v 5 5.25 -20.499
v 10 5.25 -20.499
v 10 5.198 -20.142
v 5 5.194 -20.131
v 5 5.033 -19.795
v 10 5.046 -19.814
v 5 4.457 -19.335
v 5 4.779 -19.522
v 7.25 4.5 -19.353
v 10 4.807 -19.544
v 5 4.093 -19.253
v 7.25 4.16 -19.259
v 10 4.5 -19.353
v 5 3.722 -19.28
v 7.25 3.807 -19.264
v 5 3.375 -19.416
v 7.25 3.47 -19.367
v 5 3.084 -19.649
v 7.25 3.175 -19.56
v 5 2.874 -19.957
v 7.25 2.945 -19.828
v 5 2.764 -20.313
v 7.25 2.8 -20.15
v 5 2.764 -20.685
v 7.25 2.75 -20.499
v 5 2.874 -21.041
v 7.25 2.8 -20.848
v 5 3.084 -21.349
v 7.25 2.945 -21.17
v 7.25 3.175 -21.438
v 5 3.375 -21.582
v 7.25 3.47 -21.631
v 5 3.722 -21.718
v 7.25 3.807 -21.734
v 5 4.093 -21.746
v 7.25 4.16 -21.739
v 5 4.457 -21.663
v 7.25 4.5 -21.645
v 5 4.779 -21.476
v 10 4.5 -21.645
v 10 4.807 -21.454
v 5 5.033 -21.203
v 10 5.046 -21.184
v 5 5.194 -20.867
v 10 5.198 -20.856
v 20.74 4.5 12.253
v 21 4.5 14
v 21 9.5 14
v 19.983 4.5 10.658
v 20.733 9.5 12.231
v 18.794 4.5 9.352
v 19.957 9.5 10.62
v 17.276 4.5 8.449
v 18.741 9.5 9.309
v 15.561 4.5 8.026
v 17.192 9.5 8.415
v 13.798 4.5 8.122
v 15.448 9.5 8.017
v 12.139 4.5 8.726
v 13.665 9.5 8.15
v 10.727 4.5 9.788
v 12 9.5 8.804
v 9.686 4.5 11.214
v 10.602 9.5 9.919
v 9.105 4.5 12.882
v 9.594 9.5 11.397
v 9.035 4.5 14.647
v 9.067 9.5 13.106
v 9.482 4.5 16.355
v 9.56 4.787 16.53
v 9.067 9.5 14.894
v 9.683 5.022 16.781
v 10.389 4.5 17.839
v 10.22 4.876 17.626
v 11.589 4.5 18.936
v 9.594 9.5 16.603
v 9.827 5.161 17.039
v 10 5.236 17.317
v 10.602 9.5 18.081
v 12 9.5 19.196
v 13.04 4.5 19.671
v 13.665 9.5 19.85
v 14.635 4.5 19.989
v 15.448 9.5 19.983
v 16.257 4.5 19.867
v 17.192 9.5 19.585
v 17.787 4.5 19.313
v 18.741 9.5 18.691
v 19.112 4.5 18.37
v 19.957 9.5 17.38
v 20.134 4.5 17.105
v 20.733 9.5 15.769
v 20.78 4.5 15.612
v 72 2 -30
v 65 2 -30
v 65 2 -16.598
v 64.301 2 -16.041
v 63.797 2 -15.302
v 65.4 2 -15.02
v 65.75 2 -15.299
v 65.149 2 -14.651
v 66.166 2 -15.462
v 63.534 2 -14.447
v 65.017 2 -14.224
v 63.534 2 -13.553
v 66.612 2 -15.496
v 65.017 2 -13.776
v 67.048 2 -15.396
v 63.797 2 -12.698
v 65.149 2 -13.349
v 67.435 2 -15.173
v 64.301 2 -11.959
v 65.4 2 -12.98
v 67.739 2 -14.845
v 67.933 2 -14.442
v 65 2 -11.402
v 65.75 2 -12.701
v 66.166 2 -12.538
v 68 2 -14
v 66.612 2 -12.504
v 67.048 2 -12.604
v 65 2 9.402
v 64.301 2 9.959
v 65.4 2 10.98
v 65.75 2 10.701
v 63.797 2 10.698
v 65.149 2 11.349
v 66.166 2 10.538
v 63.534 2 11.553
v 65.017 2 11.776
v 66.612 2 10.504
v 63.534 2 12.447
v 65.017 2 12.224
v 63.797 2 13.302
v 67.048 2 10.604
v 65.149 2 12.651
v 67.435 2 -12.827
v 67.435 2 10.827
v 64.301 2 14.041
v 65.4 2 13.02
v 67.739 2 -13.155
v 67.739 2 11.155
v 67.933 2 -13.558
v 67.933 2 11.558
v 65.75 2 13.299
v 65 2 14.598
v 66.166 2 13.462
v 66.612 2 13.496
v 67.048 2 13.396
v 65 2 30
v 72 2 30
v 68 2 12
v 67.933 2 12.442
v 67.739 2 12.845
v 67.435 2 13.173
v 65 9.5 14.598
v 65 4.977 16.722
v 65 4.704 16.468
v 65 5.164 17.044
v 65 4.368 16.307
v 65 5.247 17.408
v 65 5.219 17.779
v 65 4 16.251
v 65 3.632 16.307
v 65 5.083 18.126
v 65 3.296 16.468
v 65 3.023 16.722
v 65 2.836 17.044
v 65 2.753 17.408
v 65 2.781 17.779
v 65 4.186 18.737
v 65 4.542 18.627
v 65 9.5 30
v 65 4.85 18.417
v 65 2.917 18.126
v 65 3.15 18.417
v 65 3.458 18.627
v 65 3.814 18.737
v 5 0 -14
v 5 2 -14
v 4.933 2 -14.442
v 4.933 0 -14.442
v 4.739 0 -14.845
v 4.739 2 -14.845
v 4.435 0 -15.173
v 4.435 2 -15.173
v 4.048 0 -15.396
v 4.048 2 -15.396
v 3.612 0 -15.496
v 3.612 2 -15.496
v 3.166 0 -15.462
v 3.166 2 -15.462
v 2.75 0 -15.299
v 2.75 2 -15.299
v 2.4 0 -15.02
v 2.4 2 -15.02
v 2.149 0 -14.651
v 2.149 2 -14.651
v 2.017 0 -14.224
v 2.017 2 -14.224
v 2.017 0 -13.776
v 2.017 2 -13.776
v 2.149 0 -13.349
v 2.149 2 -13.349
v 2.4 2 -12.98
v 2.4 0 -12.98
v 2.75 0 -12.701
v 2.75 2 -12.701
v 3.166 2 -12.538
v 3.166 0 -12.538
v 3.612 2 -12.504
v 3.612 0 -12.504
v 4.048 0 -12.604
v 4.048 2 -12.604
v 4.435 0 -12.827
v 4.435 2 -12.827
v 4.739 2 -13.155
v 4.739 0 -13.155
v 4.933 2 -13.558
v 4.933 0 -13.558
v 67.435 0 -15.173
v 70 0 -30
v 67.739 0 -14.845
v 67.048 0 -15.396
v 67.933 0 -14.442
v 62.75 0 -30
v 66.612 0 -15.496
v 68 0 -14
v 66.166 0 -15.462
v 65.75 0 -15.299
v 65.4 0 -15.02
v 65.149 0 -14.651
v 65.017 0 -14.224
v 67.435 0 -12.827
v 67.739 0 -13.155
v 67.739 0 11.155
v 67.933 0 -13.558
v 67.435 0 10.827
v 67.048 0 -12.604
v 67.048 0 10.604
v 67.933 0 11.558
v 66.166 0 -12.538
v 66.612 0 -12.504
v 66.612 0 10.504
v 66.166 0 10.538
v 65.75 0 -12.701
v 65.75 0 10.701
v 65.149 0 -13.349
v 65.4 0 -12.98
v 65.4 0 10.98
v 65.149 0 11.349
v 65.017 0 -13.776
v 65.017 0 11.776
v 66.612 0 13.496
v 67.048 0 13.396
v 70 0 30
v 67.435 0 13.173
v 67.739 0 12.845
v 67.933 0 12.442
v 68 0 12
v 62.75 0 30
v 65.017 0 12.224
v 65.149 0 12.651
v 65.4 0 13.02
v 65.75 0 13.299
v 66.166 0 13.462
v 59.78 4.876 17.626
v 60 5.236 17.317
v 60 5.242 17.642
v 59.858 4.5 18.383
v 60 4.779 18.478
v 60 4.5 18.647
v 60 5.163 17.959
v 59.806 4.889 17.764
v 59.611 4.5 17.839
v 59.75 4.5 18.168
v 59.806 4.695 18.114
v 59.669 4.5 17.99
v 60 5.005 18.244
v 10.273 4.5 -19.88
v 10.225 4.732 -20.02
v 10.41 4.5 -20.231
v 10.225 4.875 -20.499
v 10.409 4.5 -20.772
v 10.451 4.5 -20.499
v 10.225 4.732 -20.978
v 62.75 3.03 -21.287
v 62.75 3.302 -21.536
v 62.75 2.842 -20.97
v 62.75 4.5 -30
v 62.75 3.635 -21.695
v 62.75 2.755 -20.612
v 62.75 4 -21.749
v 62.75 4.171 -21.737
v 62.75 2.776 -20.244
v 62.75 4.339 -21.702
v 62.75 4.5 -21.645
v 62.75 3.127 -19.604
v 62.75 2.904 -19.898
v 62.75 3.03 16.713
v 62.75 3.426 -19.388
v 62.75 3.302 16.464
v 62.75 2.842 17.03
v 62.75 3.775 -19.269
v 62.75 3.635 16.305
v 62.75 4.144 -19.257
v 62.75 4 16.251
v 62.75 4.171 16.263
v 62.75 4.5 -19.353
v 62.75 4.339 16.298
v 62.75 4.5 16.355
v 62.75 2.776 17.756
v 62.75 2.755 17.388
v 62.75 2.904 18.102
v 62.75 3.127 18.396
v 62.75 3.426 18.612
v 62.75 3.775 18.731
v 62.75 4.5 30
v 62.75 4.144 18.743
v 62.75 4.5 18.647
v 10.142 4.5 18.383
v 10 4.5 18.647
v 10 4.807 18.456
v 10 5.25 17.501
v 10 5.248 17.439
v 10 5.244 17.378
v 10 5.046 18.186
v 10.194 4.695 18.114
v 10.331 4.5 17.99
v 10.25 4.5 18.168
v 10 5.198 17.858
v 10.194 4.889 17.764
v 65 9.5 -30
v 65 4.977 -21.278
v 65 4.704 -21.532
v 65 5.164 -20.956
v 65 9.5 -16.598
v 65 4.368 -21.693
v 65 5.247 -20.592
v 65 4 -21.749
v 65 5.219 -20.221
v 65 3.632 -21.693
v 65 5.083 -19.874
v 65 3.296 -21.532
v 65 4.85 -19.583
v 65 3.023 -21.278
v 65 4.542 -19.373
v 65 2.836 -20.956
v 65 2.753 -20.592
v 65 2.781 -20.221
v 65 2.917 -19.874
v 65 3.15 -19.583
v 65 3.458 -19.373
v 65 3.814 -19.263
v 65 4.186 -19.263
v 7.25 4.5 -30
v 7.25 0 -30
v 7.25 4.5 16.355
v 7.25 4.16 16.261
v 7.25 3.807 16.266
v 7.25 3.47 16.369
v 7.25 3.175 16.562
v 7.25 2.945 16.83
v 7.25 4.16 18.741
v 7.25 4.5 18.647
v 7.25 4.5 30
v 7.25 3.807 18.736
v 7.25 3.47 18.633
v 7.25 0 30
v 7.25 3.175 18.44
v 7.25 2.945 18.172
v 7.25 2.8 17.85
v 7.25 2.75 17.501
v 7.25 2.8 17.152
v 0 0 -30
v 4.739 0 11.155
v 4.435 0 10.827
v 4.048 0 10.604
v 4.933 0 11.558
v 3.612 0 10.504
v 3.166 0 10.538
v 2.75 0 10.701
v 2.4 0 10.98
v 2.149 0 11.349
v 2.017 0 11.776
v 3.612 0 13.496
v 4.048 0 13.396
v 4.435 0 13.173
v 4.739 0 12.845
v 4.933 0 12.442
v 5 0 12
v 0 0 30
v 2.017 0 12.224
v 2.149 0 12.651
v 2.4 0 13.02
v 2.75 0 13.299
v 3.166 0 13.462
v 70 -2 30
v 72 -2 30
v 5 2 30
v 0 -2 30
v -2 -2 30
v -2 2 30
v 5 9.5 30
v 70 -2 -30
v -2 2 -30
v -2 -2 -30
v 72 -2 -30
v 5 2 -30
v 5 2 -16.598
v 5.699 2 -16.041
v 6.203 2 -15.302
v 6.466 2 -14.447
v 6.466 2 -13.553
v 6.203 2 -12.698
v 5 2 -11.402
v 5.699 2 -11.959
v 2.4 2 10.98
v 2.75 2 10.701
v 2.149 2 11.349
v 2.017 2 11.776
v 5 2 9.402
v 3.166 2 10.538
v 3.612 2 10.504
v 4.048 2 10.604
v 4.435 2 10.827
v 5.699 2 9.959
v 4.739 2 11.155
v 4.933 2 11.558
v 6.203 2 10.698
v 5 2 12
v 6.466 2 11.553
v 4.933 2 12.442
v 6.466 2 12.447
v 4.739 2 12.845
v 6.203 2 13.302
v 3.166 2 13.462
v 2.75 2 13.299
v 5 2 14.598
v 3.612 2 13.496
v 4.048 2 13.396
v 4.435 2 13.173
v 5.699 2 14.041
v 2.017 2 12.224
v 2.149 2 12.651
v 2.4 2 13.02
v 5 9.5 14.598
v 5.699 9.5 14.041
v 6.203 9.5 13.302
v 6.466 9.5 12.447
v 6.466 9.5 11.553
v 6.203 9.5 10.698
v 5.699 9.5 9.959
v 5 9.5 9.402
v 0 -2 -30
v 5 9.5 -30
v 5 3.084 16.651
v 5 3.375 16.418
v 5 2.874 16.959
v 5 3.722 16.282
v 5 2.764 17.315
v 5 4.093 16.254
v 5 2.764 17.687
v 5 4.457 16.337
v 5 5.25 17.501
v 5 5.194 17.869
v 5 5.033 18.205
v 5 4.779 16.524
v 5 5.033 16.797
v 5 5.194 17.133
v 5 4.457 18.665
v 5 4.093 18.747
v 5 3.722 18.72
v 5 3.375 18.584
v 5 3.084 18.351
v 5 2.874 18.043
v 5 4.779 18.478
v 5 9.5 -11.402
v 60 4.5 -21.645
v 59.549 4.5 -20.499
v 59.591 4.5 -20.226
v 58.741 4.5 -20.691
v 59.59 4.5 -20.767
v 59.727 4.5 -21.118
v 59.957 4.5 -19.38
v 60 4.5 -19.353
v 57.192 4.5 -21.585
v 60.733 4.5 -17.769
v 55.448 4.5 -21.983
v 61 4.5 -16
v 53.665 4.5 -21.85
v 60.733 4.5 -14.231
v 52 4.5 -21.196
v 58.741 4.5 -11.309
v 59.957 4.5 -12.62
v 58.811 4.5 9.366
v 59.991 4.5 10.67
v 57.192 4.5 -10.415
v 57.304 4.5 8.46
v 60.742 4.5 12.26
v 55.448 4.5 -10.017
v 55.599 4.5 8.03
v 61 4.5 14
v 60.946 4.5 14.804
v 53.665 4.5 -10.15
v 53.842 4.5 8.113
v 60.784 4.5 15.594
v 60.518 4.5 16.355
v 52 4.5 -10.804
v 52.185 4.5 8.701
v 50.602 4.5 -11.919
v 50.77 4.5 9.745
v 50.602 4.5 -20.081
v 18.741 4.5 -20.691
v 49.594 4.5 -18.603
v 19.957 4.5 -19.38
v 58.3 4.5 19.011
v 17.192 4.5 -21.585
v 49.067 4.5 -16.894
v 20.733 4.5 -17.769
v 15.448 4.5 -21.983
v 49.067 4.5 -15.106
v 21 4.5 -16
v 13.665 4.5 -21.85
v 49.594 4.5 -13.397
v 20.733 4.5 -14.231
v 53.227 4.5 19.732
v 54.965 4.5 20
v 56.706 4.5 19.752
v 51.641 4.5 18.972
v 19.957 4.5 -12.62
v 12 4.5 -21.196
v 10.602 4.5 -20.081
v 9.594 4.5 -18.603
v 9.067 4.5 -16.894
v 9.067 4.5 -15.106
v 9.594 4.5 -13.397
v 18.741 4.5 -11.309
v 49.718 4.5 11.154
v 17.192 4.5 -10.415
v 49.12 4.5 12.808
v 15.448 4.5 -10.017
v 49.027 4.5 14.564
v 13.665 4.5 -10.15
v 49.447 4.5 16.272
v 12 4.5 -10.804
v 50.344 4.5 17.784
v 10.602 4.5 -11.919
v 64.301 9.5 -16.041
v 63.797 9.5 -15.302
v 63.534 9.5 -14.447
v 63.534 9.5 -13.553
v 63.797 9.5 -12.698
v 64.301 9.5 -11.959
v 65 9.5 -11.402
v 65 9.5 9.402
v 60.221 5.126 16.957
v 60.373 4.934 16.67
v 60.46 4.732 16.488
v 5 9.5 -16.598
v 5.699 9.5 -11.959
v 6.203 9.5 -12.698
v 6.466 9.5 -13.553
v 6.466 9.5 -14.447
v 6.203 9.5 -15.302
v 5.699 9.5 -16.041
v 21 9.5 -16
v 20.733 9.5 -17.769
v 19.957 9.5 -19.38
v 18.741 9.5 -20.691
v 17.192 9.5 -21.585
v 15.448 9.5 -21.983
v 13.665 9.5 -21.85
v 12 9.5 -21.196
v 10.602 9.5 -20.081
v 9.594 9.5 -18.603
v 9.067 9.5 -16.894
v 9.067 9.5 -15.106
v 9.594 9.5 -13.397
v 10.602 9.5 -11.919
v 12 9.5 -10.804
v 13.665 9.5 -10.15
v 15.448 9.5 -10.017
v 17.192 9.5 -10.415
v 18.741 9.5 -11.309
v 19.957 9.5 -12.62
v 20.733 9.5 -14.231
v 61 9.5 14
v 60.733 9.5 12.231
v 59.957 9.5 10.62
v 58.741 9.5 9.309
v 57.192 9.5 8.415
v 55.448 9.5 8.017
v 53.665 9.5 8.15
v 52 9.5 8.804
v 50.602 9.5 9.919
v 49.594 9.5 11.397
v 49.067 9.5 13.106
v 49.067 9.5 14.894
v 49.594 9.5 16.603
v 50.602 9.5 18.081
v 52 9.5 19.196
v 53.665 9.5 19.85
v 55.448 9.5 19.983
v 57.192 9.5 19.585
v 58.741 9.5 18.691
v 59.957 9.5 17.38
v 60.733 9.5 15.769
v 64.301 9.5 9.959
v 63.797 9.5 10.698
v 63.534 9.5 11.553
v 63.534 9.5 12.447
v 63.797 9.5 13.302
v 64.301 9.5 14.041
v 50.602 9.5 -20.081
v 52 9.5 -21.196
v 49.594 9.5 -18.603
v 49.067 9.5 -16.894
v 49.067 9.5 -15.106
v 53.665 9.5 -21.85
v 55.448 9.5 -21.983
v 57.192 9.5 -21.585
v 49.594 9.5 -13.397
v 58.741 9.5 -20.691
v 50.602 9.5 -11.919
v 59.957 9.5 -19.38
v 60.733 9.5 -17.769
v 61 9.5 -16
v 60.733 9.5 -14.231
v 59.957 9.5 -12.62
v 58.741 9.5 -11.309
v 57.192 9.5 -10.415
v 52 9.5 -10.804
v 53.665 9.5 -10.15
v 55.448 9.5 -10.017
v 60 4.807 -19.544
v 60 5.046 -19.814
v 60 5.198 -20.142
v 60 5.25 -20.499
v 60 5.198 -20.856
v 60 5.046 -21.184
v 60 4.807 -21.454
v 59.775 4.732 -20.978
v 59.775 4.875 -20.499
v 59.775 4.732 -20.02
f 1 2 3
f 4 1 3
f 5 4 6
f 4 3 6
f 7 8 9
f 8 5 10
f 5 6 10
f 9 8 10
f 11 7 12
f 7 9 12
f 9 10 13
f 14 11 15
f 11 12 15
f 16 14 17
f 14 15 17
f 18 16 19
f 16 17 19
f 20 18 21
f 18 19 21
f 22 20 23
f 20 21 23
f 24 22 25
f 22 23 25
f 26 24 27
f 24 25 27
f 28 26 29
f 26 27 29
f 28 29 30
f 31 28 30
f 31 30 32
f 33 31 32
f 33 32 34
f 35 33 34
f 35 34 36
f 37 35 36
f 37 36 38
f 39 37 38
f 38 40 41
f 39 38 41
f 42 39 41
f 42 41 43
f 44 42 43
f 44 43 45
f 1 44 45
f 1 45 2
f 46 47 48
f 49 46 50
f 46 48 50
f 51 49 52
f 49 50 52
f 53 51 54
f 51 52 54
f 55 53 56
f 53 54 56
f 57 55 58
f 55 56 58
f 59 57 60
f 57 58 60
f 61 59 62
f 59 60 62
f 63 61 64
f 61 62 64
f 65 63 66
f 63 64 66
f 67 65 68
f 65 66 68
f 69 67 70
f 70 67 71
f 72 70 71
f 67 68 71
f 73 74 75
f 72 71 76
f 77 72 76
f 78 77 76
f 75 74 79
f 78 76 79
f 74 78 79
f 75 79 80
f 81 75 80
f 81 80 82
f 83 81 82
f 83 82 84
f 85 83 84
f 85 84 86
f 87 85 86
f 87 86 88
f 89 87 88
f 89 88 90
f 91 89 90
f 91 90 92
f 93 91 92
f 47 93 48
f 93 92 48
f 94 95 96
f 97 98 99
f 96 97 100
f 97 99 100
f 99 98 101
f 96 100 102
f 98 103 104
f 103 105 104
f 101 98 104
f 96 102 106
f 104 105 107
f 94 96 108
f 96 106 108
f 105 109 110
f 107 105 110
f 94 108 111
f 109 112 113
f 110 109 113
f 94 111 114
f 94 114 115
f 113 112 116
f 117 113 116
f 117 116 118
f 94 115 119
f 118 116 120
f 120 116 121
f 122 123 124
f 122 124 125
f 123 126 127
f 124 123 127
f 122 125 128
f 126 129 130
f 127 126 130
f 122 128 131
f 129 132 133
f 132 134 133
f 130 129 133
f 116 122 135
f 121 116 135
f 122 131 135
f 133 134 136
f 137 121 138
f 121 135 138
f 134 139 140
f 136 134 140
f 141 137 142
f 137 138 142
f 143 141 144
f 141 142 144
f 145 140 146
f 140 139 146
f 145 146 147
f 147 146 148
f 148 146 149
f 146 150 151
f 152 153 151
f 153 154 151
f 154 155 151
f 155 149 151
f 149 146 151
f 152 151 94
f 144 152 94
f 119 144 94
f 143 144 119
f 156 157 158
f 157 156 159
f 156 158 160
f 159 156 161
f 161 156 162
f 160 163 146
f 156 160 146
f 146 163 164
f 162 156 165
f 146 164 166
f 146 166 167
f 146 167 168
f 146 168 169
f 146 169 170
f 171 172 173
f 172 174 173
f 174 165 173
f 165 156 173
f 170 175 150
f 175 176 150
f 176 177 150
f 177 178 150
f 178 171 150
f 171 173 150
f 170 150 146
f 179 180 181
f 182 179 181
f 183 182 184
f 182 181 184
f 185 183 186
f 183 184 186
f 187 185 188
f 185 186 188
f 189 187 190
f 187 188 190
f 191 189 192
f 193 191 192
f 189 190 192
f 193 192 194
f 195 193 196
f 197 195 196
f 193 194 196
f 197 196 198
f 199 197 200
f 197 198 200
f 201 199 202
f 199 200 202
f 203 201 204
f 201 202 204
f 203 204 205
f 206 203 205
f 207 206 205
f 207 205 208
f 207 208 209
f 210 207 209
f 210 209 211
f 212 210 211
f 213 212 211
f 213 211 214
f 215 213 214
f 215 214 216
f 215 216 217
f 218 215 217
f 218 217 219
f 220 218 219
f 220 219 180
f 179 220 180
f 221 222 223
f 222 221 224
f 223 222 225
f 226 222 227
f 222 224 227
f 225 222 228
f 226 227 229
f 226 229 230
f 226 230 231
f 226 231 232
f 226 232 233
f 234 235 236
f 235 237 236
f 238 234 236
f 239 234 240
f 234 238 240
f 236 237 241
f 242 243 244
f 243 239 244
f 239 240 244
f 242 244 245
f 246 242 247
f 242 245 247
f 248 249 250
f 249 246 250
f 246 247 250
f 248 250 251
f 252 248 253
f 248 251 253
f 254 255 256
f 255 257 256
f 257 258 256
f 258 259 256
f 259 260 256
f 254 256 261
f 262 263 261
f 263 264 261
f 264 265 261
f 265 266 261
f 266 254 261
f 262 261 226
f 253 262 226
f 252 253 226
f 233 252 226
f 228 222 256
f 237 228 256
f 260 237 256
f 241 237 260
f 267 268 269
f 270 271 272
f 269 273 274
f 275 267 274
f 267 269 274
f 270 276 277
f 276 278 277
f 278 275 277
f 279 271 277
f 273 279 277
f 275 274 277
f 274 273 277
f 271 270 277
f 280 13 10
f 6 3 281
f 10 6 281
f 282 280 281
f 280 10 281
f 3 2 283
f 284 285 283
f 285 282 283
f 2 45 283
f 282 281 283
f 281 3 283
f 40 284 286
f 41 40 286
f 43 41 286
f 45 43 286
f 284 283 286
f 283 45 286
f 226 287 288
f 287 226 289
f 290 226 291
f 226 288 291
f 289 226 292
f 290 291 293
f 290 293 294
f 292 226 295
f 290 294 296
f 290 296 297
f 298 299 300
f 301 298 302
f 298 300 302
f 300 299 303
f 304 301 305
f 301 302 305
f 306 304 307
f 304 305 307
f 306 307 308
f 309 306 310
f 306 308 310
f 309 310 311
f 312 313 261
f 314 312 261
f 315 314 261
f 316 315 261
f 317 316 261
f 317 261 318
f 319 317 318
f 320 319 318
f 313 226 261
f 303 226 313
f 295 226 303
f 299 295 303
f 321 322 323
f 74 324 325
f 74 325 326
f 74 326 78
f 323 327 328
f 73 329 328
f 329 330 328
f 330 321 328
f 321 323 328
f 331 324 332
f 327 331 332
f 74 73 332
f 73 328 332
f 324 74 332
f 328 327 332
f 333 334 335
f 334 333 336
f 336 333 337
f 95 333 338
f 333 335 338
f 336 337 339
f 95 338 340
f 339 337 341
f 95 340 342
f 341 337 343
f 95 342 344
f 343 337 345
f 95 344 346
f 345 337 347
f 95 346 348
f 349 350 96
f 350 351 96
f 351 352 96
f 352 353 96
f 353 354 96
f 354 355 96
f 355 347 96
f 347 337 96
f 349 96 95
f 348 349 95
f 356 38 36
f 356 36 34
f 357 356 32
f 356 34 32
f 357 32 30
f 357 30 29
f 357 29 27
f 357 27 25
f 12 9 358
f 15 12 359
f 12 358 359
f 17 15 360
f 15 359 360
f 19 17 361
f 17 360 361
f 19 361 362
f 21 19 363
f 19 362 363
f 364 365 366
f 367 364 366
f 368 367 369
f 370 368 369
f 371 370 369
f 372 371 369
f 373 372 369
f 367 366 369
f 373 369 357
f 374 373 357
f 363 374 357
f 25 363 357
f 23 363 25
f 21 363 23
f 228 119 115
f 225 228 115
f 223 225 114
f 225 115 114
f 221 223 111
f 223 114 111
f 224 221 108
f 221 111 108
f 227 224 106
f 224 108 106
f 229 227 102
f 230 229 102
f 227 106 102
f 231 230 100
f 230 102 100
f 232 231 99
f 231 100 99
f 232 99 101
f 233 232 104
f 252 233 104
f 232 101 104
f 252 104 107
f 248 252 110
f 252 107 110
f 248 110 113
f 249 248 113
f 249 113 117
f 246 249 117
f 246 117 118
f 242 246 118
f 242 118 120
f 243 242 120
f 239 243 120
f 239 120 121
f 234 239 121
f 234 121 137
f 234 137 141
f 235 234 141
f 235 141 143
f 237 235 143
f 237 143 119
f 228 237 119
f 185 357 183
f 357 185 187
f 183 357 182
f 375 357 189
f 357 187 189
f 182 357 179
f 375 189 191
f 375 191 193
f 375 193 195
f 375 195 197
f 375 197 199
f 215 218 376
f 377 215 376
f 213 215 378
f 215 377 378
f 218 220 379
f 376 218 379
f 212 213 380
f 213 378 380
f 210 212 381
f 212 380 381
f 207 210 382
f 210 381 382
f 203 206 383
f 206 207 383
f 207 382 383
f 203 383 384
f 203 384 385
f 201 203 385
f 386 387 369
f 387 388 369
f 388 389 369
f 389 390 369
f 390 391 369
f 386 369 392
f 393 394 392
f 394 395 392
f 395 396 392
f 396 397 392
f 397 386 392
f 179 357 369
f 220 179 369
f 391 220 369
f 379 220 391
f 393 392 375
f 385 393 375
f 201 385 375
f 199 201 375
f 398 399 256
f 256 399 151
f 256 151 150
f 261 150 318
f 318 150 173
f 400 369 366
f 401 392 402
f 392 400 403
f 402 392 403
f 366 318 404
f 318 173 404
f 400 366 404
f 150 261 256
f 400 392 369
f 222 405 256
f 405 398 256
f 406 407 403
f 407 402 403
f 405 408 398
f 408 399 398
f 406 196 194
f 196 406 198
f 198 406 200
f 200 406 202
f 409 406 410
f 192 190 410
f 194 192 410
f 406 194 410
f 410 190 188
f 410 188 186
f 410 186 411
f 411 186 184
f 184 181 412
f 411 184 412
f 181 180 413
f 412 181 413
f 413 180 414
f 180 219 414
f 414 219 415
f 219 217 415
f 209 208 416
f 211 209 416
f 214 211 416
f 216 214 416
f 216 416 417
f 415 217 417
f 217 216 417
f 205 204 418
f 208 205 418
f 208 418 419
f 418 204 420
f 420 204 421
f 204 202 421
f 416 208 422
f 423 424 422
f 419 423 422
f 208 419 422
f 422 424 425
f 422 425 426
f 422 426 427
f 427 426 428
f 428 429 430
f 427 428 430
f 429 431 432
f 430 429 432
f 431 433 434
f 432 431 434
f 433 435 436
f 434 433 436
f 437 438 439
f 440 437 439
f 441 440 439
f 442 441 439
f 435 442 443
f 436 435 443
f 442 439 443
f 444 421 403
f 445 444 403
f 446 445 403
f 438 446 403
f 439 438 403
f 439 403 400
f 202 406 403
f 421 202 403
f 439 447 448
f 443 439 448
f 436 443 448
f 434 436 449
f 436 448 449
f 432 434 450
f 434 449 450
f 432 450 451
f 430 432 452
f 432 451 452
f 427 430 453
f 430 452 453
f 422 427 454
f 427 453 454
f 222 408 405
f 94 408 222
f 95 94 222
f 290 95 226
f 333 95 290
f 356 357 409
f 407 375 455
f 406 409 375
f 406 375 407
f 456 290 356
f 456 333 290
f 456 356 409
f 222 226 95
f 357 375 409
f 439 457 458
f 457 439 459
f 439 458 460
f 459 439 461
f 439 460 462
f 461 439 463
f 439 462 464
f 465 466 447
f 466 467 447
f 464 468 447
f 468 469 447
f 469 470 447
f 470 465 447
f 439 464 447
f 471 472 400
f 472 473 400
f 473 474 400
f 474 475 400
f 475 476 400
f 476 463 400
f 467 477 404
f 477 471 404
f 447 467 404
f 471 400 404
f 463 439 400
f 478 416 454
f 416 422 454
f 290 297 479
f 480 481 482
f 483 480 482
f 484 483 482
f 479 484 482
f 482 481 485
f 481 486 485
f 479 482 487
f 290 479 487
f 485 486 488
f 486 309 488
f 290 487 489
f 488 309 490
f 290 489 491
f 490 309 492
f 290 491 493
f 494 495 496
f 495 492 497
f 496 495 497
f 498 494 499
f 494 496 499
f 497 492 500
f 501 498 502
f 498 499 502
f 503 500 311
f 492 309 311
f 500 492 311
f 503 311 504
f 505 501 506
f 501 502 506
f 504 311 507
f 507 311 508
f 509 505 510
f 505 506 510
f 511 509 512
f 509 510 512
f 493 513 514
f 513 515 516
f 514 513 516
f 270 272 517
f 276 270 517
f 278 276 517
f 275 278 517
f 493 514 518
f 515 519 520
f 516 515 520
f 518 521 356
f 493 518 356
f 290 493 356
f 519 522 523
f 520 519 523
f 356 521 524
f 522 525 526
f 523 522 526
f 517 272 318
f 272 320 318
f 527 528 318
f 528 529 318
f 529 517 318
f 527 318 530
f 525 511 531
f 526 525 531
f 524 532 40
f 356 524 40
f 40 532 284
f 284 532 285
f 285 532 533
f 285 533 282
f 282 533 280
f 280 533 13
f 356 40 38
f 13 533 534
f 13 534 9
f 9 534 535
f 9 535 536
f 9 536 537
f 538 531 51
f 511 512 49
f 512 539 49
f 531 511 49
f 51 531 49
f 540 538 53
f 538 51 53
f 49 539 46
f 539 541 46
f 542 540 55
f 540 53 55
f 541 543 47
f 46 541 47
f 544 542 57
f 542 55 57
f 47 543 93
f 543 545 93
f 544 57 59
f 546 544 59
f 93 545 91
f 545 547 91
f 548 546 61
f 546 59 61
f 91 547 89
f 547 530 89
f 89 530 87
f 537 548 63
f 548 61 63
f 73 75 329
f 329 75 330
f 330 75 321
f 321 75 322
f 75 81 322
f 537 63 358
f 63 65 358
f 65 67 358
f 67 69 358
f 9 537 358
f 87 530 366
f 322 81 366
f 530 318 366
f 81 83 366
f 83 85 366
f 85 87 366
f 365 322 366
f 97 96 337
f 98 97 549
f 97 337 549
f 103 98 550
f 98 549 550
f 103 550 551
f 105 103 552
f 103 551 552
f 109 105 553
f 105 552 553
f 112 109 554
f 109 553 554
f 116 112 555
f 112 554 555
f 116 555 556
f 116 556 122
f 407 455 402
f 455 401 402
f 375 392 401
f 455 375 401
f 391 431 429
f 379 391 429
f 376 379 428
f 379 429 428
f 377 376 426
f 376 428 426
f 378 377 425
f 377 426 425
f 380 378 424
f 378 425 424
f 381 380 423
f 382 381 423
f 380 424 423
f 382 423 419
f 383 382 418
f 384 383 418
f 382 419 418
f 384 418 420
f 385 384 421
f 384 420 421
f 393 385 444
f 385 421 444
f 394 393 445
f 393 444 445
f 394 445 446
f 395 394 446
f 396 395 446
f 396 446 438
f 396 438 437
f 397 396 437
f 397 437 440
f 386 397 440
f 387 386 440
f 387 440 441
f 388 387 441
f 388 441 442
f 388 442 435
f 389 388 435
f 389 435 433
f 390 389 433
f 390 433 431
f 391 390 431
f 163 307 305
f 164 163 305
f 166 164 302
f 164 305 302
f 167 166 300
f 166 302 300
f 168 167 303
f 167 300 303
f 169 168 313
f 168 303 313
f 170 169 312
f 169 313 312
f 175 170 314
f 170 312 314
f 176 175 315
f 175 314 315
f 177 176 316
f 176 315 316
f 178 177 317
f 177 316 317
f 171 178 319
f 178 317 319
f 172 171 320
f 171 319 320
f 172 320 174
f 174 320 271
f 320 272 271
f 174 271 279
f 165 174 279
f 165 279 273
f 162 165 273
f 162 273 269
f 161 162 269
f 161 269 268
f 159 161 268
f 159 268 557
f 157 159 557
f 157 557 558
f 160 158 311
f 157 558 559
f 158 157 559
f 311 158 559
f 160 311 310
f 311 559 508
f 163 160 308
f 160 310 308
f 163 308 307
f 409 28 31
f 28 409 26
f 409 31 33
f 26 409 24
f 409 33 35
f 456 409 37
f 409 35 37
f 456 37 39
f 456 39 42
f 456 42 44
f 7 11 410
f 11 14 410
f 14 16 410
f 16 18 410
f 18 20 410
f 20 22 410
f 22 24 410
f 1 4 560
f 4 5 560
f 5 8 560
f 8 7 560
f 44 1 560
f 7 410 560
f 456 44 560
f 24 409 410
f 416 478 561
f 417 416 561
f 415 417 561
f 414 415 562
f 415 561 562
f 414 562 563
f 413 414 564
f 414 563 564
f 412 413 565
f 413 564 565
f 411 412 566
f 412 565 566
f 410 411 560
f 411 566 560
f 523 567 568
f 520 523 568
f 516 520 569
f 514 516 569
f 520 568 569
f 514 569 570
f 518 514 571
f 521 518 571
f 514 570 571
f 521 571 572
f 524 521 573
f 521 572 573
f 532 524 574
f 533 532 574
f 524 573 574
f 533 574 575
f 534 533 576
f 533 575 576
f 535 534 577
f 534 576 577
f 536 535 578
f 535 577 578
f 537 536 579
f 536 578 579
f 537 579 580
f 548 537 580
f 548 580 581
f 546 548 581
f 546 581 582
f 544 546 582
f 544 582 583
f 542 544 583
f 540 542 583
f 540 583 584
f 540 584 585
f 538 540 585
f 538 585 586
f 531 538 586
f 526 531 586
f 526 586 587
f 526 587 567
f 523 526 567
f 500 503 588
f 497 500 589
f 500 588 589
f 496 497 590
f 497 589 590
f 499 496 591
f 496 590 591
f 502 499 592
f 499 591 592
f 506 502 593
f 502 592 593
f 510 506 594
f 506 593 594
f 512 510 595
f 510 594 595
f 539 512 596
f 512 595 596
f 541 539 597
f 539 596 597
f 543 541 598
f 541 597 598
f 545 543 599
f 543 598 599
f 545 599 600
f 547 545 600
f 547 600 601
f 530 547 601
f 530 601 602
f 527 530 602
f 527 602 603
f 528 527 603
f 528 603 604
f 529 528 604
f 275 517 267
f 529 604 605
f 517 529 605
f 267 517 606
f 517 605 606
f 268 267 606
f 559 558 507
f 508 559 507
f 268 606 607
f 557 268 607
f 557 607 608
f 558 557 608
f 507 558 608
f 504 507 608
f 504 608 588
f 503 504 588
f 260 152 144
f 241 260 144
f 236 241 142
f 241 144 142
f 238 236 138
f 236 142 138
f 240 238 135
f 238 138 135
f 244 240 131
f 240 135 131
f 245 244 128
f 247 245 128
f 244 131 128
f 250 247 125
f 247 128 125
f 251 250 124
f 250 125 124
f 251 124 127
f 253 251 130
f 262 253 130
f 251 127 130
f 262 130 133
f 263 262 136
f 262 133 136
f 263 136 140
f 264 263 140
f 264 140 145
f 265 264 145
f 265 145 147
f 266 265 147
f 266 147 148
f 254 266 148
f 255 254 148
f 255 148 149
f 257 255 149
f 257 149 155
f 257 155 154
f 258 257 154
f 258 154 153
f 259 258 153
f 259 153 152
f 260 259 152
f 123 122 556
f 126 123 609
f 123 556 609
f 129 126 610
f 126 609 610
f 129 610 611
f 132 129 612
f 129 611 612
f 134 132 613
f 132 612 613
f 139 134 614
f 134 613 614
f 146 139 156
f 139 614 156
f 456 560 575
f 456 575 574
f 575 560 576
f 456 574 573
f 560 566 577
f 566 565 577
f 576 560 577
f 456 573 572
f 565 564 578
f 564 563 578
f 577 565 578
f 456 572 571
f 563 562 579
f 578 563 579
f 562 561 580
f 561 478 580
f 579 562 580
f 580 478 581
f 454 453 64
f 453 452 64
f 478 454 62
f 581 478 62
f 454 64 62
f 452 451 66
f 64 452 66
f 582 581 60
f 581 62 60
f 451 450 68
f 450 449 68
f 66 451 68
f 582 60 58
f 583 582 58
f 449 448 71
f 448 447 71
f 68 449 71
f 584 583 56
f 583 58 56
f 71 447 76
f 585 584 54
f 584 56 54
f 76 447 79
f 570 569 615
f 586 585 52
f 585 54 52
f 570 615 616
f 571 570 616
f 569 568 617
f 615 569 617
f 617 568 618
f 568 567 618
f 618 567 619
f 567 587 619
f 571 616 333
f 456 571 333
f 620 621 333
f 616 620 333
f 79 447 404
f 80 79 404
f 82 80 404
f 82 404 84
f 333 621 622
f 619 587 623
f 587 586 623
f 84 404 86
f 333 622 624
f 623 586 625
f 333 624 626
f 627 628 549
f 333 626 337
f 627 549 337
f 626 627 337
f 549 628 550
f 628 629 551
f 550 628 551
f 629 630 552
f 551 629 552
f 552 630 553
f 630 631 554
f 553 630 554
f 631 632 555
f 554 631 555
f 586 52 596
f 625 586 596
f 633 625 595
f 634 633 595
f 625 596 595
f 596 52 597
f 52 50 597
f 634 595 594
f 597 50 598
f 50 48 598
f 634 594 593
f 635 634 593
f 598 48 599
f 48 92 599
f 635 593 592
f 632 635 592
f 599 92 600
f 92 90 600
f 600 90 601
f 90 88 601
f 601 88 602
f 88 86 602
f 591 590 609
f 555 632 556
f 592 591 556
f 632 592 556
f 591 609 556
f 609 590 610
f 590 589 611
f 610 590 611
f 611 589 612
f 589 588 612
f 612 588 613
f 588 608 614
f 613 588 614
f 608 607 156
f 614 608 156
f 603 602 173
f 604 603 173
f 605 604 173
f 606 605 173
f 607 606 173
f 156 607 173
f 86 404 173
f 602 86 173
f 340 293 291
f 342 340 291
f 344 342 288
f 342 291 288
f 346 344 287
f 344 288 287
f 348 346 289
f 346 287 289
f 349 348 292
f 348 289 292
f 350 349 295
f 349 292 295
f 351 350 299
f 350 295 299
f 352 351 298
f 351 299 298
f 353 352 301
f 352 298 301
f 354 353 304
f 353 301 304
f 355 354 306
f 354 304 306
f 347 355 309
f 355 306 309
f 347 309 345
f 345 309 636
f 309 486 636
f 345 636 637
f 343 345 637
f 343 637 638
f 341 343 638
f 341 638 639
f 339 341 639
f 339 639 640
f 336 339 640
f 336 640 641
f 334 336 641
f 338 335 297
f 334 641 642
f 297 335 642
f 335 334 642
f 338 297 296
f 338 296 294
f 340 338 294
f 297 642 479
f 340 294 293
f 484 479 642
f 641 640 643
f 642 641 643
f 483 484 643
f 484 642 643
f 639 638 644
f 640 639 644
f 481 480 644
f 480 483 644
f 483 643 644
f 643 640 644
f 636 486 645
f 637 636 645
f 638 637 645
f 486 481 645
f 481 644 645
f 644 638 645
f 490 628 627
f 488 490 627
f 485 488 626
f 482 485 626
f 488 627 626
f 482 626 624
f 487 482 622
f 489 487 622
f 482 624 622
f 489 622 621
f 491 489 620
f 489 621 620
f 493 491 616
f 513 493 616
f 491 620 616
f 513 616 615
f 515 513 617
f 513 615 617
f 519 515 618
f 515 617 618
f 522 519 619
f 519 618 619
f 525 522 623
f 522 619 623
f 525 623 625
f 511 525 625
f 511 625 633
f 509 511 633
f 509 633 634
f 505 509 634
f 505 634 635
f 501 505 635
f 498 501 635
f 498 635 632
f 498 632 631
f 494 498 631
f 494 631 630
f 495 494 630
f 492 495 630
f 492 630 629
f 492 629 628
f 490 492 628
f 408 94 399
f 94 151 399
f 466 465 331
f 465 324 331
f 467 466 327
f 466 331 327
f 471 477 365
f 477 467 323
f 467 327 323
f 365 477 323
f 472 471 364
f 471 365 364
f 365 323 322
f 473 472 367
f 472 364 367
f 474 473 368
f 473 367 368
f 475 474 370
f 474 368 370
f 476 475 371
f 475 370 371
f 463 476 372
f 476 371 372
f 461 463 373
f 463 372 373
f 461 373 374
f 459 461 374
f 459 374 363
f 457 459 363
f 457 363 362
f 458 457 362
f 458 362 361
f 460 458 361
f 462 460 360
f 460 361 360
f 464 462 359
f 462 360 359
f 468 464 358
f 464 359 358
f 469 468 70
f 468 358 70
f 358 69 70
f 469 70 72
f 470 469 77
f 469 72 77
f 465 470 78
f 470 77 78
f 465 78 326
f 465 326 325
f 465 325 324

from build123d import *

# Parameters (mm, degrees)
BOSS_EXTRUDE1_DEPTH             = 30
M3_TAPPED_HOLE1_D               = 2.5
M3_TAPPED_HOLE1_DEPTH           = 5
M3_TAPPED_HOLE1_TIP             = 0.751075774
M3_TAPPED_HOLE1_ON_FACE_2_D     = 2.5
M3_TAPPED_HOLE1_ON_FACE_2_DEPTH = 5
M3_TAPPED_HOLE1_ON_FACE_2_TIP   = 0.751075774
SKETCH7_R                       = 1.5
CUT_EXTRUDE2_DEPTH              = 5
SKETCH8_R                       = 3
CUT_EXTRUDE3_DEPTH              = 7.5
SKETCH2_R                       = 6
CUT_EXTRUDE1_DEPTH              = 12.5


with BuildPart() as part:
    # Sketch1 → Boss-Extrude1 (new body, symmetric)
    with BuildSketch(Plane.XY):
        Polygon((0, 0), (0, -2), (-2, -2), (-2, 2), (5, 2), (5, 9.5), (65, 9.5), (65, 2), (72, 2), (72, -2), (70, -2), (70, 0), (62.75, 0), (62.75, 4.5), (7.25, 4.5), (7.25, 0), align=None)
    extrude(amount=BOSS_EXTRUDE1_DEPTH, both=True)

    # M3 Tapped Hole1
    with Locations(Plane(origin=(5, 4, 17.50098961), x_dir=(0, -1, 0), z_dir=(-1, 0, 0))):
        with Locations((0, 0), (0, -38)):
            Hole(M3_TAPPED_HOLE1_D / 2, depth=M3_TAPPED_HOLE1_DEPTH)
            with Locations((0, 0, -(M3_TAPPED_HOLE1_DEPTH + M3_TAPPED_HOLE1_TIP / 2))):  # 118° drill point
                Cone(0, M3_TAPPED_HOLE1_D / 2, M3_TAPPED_HOLE1_TIP, mode=Mode.SUBTRACT)

    # M3 Tapped Hole1 on face 2
    with Locations(Plane(origin=(65, 4, 17.50098961), x_dir=(0, 0, 1), z_dir=(1, 0, 0))):
        with Locations((0, 0), (-38, 0)):
            Hole(M3_TAPPED_HOLE1_ON_FACE_2_D / 2, depth=M3_TAPPED_HOLE1_ON_FACE_2_DEPTH)
            with Locations((0, 0, -(M3_TAPPED_HOLE1_ON_FACE_2_DEPTH + M3_TAPPED_HOLE1_ON_FACE_2_TIP / 2))):  # 118° drill point
                Cone(0, M3_TAPPED_HOLE1_ON_FACE_2_D / 2, M3_TAPPED_HOLE1_ON_FACE_2_TIP, mode=Mode.SUBTRACT)

    # Sketch7 → Cut-Extrude2 (cut, through all)
    with BuildSketch(Plane(origin=(0, 2, 0), x_dir=(1, 0, 0), z_dir=(0, 1, 0))):
        with Locations((3.5, 14)):
            Circle(SKETCH7_R)
        with Locations((66.5, 14)):
            Circle(SKETCH7_R)
        with Locations((3.5, -12)):
            Circle(SKETCH7_R)
        with Locations((66.5, -12)):
            Circle(SKETCH7_R)
    extrude(amount=-CUT_EXTRUDE2_DEPTH, mode=Mode.SUBTRACT)

    # Sketch8 → Cut-Extrude3 (cut)
    with BuildSketch(Plane(origin=(0, 9.5, 0), x_dir=(1, 0, 0), z_dir=(0, 1, 0))):
        with Locations((3.5, 14)):
            Circle(SKETCH8_R)
        with Locations((3.5, -12)):
            Circle(SKETCH8_R)
        with Locations((66.5, 14)):
            Circle(SKETCH8_R)
        with Locations((66.5, -12)):
            Circle(SKETCH8_R)
    extrude(amount=-CUT_EXTRUDE3_DEPTH, mode=Mode.SUBTRACT)

    # Sketch2 → Cut-Extrude1 (cut, through all)
    with BuildSketch(Plane(origin=(0, 9.5, 0), x_dir=(1, 0, 0), z_dir=(0, 1, 0))):
        with Locations((15, 16)):
            Circle(SKETCH2_R)
        with Locations((55, 16)):
            Circle(SKETCH2_R)
        with Locations((15, -14)):
            Circle(SKETCH2_R)
        with Locations((55, -14)):
            Circle(SKETCH2_R)
    extrude(amount=-CUT_EXTRUDE1_DEPTH, mode=Mode.SUBTRACT)


solid = part.part
